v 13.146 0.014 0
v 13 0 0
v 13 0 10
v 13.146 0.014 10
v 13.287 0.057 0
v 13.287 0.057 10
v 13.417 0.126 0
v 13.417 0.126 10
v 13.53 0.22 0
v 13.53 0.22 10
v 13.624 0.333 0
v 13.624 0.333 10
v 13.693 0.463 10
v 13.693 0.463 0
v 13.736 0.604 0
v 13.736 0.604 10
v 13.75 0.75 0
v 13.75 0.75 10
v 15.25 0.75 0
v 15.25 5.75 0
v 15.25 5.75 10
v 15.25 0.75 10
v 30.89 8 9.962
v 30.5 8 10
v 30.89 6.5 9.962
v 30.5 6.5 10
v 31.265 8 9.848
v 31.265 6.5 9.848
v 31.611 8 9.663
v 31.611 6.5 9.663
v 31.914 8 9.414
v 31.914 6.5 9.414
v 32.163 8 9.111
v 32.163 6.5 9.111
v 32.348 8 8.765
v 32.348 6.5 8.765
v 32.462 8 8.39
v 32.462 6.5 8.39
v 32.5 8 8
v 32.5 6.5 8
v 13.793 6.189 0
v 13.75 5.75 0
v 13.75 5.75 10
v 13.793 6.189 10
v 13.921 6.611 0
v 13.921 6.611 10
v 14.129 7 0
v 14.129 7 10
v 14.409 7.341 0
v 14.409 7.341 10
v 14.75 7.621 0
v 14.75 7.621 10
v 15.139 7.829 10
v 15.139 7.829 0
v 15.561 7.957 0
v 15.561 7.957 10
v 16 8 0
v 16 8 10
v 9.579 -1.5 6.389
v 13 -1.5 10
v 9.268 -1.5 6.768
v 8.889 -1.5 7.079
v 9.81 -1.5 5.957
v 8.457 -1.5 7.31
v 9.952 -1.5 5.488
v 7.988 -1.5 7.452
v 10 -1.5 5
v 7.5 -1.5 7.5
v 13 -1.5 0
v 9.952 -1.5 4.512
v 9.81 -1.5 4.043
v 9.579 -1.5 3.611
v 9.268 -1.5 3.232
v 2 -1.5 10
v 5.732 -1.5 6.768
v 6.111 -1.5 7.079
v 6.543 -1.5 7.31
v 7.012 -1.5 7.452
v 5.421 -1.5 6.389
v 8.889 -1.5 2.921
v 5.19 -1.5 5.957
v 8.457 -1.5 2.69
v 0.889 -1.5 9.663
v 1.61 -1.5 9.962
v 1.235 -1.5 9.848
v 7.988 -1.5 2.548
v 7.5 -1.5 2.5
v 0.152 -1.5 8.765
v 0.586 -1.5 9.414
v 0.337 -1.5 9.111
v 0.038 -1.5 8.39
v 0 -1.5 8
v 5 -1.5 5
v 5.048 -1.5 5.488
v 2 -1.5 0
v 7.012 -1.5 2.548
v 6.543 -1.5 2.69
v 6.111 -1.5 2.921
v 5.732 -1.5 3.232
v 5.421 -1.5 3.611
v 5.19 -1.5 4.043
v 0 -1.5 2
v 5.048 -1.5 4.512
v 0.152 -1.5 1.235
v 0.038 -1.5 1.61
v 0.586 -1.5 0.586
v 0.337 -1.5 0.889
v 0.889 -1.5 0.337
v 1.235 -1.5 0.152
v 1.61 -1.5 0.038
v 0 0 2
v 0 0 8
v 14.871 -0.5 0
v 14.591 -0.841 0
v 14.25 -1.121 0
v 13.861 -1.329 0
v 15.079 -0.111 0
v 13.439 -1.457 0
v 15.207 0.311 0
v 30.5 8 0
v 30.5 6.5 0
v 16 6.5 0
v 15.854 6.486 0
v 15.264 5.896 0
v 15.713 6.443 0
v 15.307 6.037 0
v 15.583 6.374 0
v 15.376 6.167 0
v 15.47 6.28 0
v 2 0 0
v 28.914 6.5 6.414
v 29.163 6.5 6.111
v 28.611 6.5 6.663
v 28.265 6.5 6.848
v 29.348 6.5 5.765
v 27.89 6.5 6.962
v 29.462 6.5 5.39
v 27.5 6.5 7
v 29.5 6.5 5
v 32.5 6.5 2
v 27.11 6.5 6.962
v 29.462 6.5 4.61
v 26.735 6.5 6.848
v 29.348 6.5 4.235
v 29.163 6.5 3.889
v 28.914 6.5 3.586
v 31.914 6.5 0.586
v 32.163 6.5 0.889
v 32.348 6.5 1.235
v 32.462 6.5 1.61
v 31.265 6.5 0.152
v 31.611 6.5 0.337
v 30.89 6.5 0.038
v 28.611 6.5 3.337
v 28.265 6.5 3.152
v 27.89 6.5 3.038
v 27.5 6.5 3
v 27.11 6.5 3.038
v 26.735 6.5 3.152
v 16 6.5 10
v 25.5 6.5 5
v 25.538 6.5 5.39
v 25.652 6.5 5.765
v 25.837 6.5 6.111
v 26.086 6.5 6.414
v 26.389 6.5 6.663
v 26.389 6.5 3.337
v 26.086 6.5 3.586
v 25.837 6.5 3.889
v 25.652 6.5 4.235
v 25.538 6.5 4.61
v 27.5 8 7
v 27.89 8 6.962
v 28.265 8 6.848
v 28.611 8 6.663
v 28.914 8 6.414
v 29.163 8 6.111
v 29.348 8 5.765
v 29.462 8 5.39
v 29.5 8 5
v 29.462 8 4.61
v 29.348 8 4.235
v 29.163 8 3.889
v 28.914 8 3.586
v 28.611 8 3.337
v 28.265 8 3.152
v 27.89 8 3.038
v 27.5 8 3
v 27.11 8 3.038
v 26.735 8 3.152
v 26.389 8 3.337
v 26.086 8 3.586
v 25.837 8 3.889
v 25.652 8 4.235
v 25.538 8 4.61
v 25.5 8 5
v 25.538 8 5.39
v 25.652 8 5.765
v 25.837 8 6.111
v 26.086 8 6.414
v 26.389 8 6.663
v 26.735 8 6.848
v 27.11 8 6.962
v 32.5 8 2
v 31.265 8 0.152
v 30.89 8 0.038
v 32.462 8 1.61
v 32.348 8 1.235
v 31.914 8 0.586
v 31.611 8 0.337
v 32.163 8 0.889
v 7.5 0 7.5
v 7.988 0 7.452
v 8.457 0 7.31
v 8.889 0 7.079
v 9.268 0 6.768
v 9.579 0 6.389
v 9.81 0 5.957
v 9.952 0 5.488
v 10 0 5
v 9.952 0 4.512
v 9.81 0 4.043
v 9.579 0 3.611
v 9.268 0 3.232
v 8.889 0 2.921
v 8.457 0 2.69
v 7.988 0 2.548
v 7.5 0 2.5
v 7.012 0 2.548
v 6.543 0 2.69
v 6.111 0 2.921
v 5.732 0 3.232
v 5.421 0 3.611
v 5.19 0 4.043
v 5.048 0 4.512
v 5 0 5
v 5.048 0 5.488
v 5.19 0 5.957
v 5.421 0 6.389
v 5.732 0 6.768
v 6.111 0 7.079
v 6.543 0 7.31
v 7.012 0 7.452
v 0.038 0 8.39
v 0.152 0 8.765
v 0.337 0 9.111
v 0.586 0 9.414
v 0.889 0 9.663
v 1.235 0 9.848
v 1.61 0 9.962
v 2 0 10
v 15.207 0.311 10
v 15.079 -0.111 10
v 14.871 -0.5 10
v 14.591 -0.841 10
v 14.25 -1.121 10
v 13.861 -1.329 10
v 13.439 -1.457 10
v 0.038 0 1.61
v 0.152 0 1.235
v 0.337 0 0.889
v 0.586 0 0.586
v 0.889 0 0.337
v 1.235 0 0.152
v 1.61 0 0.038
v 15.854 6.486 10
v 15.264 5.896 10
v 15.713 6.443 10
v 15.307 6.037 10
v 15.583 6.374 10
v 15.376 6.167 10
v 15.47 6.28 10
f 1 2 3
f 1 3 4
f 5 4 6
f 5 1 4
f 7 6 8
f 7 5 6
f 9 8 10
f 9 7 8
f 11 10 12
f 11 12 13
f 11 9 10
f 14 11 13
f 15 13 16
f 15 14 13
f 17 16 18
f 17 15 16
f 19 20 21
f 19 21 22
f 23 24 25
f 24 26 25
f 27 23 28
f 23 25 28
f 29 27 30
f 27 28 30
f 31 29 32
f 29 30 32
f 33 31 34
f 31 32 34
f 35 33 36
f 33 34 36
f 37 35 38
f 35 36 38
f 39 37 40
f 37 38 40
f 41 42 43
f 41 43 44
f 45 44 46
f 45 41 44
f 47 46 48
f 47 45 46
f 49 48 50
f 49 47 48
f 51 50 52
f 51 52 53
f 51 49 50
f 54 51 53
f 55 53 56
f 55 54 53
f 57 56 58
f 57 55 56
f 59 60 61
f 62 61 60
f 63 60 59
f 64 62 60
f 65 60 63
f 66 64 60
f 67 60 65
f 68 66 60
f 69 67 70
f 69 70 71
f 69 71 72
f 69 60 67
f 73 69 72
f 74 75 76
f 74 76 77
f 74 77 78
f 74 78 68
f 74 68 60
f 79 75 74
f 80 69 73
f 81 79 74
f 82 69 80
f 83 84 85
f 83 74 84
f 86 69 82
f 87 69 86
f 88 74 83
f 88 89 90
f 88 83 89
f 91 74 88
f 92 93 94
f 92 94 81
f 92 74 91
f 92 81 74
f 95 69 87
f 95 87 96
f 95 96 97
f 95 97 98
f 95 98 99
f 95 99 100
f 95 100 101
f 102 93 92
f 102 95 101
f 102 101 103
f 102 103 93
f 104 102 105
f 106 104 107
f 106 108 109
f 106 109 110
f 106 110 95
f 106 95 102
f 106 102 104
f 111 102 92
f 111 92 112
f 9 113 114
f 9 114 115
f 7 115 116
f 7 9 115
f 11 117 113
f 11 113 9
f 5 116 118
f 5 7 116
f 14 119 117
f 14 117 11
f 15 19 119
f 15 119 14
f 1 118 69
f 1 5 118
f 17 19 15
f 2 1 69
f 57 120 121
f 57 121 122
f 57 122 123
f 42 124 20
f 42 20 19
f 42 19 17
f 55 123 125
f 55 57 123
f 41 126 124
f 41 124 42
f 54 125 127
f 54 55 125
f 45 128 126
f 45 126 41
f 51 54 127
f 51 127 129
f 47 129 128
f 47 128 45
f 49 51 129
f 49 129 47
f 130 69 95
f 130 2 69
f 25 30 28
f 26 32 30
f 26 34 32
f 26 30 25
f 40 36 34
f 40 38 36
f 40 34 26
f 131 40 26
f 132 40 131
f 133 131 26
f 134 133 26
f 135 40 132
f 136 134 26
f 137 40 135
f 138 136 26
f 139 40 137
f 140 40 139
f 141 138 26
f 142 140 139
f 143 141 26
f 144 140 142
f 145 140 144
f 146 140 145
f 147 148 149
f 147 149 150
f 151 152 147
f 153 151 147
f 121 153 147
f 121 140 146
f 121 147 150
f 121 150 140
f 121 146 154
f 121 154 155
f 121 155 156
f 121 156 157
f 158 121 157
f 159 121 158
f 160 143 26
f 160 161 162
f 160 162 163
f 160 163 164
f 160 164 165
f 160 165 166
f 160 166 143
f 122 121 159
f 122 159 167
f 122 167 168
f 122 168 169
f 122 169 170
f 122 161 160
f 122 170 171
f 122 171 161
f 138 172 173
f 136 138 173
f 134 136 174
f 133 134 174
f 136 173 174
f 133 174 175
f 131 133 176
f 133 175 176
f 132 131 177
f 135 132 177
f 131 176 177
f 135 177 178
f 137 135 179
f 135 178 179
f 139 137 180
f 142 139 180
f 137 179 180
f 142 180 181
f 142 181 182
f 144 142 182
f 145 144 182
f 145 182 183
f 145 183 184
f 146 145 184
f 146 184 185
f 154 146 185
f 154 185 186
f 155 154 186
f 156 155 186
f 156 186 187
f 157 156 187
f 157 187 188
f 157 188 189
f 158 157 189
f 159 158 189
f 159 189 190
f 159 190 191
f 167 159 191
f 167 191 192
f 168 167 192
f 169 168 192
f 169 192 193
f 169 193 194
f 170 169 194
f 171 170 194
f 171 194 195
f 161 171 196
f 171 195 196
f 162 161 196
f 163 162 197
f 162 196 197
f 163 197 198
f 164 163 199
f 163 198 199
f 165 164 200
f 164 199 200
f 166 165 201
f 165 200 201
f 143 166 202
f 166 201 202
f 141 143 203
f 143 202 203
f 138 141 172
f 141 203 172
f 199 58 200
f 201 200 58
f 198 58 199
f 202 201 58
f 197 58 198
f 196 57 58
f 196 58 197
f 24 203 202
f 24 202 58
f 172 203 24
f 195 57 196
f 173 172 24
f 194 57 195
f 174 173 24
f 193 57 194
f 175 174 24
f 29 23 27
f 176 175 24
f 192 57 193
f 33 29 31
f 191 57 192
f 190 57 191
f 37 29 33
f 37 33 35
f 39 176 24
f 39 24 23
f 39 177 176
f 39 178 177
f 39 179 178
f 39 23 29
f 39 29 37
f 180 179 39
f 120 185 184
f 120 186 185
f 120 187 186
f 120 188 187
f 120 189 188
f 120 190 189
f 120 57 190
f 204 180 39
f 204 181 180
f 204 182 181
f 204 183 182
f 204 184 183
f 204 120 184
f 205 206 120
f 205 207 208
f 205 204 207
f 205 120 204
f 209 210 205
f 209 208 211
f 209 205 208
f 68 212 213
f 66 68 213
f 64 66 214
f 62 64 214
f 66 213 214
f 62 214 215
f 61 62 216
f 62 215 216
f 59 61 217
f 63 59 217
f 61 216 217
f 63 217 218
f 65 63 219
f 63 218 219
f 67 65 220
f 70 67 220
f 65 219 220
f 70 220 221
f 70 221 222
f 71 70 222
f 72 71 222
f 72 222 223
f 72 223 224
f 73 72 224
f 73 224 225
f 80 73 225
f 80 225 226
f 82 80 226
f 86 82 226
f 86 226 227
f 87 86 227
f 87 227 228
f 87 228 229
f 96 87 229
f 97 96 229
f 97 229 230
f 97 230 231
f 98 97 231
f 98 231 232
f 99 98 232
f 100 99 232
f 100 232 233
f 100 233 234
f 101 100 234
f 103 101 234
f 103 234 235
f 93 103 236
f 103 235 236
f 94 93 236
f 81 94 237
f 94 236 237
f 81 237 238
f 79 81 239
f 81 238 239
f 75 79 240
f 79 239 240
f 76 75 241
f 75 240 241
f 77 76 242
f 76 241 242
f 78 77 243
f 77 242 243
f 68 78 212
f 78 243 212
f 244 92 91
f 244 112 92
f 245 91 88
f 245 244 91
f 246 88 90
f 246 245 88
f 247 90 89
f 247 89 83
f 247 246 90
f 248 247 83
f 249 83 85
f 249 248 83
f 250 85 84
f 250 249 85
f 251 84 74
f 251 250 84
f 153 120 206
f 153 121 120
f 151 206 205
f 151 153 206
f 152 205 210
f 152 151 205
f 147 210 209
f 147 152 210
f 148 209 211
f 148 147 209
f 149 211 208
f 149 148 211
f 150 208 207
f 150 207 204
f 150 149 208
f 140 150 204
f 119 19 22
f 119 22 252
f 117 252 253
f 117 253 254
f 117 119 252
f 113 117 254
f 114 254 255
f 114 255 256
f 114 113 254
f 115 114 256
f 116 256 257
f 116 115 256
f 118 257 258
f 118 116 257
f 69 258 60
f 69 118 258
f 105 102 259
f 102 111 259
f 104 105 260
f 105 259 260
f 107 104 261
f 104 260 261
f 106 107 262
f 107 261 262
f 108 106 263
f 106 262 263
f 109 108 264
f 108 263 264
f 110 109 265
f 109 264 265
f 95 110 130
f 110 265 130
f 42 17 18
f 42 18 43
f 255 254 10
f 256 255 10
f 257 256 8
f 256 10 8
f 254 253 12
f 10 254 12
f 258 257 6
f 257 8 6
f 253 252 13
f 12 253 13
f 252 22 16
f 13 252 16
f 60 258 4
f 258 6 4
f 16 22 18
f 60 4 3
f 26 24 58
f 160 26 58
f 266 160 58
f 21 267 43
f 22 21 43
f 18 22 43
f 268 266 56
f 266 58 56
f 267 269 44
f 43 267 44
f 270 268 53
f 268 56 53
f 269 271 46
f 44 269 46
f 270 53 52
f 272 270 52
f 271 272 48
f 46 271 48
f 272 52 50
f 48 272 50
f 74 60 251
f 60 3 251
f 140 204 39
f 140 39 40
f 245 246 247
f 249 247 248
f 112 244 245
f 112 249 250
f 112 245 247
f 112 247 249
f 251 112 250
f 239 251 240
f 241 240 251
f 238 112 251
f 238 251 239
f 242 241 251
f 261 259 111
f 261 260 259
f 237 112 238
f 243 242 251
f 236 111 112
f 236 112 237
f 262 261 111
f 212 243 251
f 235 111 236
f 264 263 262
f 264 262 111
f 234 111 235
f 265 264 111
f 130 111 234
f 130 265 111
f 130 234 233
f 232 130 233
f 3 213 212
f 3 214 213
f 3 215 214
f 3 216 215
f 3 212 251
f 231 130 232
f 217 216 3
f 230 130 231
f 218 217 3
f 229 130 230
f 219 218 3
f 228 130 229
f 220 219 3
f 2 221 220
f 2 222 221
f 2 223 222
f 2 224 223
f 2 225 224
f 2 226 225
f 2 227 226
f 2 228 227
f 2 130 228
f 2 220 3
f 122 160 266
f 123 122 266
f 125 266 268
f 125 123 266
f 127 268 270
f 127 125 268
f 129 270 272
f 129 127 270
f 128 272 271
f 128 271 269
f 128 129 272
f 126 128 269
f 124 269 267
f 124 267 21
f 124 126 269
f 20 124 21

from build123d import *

# Parameters (mm, degrees)
BASE_FLANGE1_DEPTH = 10
SKETCH6_R          = 2.5
CUT_EXTRUDE1_DEPTH = 35.932076949
SKETCH7_R          = 2
CUT_EXTRUDE2_DEPTH = 36.305806888
FILLET1_R          = 2


# Sheet-metal steps are written as plain solids
with BuildPart() as part:
    # Sketch1 → Base-Flange1 (new body)
    with BuildSketch(Plane.XY):
        with BuildLine():
            Line((0, 0), (13, 0))
            ThreePointArc((13, 0), (13.530330086, 0.219669914), (13.75, 0.75))
            Line((13.75, 0.75), (13.75, 5.75))
            ThreePointArc((13.75, 5.75), (14.409009742, 7.340990258), (16, 8))
            Line((16, 8), (32.5, 8))
            Line((32.5, 8), (32.5, 6.5))
            Line((32.5, 6.5), (16, 6.5))
            ThreePointArc((16, 6.5), (15.469669914, 6.280330086), (15.25, 5.75))
            Line((15.25, 5.75), (15.25, 0.75))
            ThreePointArc((15.25, 0.75), (14.590990258, -0.840990258), (13, -1.5))
            Line((13, -1.5), (0, -1.5))
            Line((0, -1.5), (0, 0))
        make_face()
    extrude(amount=BASE_FLANGE1_DEPTH)

    # Sketch6 → Cut-Extrude1 (cut, through all)
    with BuildSketch(Plane(origin=(0, 0, 0), x_dir=(1, 0, 0), z_dir=(0, 1, 0))):
        with Locations(Location((7.5, -5, 0), (0, 0, 270))):
            Circle(SKETCH6_R)
    extrude(amount=-CUT_EXTRUDE1_DEPTH, mode=Mode.SUBTRACT)

    # Sketch7 → Cut-Extrude2 (cut, through all)
    with BuildSketch(Plane(origin=(0, 8, 0), x_dir=(1, 0, 0), z_dir=(0, 1, 0))):
        with Locations(Location((27.5, -5, 0), (0, 0, 270))):
            Circle(SKETCH7_R)
    extrude(amount=-CUT_EXTRUDE2_DEPTH, mode=Mode.SUBTRACT)

    # Fillet1
    fillet1_edges = [part.edges().sort_by_distance(p)[0] for p in [
        (0, -0.75, 0),
        (32.5, 7.25, 0),
        (0, -0.75, 10),
        (32.5, 7.25, 10),
    ]]
    fillet(fillet1_edges, radius=FILLET1_R)


solid = part.part
